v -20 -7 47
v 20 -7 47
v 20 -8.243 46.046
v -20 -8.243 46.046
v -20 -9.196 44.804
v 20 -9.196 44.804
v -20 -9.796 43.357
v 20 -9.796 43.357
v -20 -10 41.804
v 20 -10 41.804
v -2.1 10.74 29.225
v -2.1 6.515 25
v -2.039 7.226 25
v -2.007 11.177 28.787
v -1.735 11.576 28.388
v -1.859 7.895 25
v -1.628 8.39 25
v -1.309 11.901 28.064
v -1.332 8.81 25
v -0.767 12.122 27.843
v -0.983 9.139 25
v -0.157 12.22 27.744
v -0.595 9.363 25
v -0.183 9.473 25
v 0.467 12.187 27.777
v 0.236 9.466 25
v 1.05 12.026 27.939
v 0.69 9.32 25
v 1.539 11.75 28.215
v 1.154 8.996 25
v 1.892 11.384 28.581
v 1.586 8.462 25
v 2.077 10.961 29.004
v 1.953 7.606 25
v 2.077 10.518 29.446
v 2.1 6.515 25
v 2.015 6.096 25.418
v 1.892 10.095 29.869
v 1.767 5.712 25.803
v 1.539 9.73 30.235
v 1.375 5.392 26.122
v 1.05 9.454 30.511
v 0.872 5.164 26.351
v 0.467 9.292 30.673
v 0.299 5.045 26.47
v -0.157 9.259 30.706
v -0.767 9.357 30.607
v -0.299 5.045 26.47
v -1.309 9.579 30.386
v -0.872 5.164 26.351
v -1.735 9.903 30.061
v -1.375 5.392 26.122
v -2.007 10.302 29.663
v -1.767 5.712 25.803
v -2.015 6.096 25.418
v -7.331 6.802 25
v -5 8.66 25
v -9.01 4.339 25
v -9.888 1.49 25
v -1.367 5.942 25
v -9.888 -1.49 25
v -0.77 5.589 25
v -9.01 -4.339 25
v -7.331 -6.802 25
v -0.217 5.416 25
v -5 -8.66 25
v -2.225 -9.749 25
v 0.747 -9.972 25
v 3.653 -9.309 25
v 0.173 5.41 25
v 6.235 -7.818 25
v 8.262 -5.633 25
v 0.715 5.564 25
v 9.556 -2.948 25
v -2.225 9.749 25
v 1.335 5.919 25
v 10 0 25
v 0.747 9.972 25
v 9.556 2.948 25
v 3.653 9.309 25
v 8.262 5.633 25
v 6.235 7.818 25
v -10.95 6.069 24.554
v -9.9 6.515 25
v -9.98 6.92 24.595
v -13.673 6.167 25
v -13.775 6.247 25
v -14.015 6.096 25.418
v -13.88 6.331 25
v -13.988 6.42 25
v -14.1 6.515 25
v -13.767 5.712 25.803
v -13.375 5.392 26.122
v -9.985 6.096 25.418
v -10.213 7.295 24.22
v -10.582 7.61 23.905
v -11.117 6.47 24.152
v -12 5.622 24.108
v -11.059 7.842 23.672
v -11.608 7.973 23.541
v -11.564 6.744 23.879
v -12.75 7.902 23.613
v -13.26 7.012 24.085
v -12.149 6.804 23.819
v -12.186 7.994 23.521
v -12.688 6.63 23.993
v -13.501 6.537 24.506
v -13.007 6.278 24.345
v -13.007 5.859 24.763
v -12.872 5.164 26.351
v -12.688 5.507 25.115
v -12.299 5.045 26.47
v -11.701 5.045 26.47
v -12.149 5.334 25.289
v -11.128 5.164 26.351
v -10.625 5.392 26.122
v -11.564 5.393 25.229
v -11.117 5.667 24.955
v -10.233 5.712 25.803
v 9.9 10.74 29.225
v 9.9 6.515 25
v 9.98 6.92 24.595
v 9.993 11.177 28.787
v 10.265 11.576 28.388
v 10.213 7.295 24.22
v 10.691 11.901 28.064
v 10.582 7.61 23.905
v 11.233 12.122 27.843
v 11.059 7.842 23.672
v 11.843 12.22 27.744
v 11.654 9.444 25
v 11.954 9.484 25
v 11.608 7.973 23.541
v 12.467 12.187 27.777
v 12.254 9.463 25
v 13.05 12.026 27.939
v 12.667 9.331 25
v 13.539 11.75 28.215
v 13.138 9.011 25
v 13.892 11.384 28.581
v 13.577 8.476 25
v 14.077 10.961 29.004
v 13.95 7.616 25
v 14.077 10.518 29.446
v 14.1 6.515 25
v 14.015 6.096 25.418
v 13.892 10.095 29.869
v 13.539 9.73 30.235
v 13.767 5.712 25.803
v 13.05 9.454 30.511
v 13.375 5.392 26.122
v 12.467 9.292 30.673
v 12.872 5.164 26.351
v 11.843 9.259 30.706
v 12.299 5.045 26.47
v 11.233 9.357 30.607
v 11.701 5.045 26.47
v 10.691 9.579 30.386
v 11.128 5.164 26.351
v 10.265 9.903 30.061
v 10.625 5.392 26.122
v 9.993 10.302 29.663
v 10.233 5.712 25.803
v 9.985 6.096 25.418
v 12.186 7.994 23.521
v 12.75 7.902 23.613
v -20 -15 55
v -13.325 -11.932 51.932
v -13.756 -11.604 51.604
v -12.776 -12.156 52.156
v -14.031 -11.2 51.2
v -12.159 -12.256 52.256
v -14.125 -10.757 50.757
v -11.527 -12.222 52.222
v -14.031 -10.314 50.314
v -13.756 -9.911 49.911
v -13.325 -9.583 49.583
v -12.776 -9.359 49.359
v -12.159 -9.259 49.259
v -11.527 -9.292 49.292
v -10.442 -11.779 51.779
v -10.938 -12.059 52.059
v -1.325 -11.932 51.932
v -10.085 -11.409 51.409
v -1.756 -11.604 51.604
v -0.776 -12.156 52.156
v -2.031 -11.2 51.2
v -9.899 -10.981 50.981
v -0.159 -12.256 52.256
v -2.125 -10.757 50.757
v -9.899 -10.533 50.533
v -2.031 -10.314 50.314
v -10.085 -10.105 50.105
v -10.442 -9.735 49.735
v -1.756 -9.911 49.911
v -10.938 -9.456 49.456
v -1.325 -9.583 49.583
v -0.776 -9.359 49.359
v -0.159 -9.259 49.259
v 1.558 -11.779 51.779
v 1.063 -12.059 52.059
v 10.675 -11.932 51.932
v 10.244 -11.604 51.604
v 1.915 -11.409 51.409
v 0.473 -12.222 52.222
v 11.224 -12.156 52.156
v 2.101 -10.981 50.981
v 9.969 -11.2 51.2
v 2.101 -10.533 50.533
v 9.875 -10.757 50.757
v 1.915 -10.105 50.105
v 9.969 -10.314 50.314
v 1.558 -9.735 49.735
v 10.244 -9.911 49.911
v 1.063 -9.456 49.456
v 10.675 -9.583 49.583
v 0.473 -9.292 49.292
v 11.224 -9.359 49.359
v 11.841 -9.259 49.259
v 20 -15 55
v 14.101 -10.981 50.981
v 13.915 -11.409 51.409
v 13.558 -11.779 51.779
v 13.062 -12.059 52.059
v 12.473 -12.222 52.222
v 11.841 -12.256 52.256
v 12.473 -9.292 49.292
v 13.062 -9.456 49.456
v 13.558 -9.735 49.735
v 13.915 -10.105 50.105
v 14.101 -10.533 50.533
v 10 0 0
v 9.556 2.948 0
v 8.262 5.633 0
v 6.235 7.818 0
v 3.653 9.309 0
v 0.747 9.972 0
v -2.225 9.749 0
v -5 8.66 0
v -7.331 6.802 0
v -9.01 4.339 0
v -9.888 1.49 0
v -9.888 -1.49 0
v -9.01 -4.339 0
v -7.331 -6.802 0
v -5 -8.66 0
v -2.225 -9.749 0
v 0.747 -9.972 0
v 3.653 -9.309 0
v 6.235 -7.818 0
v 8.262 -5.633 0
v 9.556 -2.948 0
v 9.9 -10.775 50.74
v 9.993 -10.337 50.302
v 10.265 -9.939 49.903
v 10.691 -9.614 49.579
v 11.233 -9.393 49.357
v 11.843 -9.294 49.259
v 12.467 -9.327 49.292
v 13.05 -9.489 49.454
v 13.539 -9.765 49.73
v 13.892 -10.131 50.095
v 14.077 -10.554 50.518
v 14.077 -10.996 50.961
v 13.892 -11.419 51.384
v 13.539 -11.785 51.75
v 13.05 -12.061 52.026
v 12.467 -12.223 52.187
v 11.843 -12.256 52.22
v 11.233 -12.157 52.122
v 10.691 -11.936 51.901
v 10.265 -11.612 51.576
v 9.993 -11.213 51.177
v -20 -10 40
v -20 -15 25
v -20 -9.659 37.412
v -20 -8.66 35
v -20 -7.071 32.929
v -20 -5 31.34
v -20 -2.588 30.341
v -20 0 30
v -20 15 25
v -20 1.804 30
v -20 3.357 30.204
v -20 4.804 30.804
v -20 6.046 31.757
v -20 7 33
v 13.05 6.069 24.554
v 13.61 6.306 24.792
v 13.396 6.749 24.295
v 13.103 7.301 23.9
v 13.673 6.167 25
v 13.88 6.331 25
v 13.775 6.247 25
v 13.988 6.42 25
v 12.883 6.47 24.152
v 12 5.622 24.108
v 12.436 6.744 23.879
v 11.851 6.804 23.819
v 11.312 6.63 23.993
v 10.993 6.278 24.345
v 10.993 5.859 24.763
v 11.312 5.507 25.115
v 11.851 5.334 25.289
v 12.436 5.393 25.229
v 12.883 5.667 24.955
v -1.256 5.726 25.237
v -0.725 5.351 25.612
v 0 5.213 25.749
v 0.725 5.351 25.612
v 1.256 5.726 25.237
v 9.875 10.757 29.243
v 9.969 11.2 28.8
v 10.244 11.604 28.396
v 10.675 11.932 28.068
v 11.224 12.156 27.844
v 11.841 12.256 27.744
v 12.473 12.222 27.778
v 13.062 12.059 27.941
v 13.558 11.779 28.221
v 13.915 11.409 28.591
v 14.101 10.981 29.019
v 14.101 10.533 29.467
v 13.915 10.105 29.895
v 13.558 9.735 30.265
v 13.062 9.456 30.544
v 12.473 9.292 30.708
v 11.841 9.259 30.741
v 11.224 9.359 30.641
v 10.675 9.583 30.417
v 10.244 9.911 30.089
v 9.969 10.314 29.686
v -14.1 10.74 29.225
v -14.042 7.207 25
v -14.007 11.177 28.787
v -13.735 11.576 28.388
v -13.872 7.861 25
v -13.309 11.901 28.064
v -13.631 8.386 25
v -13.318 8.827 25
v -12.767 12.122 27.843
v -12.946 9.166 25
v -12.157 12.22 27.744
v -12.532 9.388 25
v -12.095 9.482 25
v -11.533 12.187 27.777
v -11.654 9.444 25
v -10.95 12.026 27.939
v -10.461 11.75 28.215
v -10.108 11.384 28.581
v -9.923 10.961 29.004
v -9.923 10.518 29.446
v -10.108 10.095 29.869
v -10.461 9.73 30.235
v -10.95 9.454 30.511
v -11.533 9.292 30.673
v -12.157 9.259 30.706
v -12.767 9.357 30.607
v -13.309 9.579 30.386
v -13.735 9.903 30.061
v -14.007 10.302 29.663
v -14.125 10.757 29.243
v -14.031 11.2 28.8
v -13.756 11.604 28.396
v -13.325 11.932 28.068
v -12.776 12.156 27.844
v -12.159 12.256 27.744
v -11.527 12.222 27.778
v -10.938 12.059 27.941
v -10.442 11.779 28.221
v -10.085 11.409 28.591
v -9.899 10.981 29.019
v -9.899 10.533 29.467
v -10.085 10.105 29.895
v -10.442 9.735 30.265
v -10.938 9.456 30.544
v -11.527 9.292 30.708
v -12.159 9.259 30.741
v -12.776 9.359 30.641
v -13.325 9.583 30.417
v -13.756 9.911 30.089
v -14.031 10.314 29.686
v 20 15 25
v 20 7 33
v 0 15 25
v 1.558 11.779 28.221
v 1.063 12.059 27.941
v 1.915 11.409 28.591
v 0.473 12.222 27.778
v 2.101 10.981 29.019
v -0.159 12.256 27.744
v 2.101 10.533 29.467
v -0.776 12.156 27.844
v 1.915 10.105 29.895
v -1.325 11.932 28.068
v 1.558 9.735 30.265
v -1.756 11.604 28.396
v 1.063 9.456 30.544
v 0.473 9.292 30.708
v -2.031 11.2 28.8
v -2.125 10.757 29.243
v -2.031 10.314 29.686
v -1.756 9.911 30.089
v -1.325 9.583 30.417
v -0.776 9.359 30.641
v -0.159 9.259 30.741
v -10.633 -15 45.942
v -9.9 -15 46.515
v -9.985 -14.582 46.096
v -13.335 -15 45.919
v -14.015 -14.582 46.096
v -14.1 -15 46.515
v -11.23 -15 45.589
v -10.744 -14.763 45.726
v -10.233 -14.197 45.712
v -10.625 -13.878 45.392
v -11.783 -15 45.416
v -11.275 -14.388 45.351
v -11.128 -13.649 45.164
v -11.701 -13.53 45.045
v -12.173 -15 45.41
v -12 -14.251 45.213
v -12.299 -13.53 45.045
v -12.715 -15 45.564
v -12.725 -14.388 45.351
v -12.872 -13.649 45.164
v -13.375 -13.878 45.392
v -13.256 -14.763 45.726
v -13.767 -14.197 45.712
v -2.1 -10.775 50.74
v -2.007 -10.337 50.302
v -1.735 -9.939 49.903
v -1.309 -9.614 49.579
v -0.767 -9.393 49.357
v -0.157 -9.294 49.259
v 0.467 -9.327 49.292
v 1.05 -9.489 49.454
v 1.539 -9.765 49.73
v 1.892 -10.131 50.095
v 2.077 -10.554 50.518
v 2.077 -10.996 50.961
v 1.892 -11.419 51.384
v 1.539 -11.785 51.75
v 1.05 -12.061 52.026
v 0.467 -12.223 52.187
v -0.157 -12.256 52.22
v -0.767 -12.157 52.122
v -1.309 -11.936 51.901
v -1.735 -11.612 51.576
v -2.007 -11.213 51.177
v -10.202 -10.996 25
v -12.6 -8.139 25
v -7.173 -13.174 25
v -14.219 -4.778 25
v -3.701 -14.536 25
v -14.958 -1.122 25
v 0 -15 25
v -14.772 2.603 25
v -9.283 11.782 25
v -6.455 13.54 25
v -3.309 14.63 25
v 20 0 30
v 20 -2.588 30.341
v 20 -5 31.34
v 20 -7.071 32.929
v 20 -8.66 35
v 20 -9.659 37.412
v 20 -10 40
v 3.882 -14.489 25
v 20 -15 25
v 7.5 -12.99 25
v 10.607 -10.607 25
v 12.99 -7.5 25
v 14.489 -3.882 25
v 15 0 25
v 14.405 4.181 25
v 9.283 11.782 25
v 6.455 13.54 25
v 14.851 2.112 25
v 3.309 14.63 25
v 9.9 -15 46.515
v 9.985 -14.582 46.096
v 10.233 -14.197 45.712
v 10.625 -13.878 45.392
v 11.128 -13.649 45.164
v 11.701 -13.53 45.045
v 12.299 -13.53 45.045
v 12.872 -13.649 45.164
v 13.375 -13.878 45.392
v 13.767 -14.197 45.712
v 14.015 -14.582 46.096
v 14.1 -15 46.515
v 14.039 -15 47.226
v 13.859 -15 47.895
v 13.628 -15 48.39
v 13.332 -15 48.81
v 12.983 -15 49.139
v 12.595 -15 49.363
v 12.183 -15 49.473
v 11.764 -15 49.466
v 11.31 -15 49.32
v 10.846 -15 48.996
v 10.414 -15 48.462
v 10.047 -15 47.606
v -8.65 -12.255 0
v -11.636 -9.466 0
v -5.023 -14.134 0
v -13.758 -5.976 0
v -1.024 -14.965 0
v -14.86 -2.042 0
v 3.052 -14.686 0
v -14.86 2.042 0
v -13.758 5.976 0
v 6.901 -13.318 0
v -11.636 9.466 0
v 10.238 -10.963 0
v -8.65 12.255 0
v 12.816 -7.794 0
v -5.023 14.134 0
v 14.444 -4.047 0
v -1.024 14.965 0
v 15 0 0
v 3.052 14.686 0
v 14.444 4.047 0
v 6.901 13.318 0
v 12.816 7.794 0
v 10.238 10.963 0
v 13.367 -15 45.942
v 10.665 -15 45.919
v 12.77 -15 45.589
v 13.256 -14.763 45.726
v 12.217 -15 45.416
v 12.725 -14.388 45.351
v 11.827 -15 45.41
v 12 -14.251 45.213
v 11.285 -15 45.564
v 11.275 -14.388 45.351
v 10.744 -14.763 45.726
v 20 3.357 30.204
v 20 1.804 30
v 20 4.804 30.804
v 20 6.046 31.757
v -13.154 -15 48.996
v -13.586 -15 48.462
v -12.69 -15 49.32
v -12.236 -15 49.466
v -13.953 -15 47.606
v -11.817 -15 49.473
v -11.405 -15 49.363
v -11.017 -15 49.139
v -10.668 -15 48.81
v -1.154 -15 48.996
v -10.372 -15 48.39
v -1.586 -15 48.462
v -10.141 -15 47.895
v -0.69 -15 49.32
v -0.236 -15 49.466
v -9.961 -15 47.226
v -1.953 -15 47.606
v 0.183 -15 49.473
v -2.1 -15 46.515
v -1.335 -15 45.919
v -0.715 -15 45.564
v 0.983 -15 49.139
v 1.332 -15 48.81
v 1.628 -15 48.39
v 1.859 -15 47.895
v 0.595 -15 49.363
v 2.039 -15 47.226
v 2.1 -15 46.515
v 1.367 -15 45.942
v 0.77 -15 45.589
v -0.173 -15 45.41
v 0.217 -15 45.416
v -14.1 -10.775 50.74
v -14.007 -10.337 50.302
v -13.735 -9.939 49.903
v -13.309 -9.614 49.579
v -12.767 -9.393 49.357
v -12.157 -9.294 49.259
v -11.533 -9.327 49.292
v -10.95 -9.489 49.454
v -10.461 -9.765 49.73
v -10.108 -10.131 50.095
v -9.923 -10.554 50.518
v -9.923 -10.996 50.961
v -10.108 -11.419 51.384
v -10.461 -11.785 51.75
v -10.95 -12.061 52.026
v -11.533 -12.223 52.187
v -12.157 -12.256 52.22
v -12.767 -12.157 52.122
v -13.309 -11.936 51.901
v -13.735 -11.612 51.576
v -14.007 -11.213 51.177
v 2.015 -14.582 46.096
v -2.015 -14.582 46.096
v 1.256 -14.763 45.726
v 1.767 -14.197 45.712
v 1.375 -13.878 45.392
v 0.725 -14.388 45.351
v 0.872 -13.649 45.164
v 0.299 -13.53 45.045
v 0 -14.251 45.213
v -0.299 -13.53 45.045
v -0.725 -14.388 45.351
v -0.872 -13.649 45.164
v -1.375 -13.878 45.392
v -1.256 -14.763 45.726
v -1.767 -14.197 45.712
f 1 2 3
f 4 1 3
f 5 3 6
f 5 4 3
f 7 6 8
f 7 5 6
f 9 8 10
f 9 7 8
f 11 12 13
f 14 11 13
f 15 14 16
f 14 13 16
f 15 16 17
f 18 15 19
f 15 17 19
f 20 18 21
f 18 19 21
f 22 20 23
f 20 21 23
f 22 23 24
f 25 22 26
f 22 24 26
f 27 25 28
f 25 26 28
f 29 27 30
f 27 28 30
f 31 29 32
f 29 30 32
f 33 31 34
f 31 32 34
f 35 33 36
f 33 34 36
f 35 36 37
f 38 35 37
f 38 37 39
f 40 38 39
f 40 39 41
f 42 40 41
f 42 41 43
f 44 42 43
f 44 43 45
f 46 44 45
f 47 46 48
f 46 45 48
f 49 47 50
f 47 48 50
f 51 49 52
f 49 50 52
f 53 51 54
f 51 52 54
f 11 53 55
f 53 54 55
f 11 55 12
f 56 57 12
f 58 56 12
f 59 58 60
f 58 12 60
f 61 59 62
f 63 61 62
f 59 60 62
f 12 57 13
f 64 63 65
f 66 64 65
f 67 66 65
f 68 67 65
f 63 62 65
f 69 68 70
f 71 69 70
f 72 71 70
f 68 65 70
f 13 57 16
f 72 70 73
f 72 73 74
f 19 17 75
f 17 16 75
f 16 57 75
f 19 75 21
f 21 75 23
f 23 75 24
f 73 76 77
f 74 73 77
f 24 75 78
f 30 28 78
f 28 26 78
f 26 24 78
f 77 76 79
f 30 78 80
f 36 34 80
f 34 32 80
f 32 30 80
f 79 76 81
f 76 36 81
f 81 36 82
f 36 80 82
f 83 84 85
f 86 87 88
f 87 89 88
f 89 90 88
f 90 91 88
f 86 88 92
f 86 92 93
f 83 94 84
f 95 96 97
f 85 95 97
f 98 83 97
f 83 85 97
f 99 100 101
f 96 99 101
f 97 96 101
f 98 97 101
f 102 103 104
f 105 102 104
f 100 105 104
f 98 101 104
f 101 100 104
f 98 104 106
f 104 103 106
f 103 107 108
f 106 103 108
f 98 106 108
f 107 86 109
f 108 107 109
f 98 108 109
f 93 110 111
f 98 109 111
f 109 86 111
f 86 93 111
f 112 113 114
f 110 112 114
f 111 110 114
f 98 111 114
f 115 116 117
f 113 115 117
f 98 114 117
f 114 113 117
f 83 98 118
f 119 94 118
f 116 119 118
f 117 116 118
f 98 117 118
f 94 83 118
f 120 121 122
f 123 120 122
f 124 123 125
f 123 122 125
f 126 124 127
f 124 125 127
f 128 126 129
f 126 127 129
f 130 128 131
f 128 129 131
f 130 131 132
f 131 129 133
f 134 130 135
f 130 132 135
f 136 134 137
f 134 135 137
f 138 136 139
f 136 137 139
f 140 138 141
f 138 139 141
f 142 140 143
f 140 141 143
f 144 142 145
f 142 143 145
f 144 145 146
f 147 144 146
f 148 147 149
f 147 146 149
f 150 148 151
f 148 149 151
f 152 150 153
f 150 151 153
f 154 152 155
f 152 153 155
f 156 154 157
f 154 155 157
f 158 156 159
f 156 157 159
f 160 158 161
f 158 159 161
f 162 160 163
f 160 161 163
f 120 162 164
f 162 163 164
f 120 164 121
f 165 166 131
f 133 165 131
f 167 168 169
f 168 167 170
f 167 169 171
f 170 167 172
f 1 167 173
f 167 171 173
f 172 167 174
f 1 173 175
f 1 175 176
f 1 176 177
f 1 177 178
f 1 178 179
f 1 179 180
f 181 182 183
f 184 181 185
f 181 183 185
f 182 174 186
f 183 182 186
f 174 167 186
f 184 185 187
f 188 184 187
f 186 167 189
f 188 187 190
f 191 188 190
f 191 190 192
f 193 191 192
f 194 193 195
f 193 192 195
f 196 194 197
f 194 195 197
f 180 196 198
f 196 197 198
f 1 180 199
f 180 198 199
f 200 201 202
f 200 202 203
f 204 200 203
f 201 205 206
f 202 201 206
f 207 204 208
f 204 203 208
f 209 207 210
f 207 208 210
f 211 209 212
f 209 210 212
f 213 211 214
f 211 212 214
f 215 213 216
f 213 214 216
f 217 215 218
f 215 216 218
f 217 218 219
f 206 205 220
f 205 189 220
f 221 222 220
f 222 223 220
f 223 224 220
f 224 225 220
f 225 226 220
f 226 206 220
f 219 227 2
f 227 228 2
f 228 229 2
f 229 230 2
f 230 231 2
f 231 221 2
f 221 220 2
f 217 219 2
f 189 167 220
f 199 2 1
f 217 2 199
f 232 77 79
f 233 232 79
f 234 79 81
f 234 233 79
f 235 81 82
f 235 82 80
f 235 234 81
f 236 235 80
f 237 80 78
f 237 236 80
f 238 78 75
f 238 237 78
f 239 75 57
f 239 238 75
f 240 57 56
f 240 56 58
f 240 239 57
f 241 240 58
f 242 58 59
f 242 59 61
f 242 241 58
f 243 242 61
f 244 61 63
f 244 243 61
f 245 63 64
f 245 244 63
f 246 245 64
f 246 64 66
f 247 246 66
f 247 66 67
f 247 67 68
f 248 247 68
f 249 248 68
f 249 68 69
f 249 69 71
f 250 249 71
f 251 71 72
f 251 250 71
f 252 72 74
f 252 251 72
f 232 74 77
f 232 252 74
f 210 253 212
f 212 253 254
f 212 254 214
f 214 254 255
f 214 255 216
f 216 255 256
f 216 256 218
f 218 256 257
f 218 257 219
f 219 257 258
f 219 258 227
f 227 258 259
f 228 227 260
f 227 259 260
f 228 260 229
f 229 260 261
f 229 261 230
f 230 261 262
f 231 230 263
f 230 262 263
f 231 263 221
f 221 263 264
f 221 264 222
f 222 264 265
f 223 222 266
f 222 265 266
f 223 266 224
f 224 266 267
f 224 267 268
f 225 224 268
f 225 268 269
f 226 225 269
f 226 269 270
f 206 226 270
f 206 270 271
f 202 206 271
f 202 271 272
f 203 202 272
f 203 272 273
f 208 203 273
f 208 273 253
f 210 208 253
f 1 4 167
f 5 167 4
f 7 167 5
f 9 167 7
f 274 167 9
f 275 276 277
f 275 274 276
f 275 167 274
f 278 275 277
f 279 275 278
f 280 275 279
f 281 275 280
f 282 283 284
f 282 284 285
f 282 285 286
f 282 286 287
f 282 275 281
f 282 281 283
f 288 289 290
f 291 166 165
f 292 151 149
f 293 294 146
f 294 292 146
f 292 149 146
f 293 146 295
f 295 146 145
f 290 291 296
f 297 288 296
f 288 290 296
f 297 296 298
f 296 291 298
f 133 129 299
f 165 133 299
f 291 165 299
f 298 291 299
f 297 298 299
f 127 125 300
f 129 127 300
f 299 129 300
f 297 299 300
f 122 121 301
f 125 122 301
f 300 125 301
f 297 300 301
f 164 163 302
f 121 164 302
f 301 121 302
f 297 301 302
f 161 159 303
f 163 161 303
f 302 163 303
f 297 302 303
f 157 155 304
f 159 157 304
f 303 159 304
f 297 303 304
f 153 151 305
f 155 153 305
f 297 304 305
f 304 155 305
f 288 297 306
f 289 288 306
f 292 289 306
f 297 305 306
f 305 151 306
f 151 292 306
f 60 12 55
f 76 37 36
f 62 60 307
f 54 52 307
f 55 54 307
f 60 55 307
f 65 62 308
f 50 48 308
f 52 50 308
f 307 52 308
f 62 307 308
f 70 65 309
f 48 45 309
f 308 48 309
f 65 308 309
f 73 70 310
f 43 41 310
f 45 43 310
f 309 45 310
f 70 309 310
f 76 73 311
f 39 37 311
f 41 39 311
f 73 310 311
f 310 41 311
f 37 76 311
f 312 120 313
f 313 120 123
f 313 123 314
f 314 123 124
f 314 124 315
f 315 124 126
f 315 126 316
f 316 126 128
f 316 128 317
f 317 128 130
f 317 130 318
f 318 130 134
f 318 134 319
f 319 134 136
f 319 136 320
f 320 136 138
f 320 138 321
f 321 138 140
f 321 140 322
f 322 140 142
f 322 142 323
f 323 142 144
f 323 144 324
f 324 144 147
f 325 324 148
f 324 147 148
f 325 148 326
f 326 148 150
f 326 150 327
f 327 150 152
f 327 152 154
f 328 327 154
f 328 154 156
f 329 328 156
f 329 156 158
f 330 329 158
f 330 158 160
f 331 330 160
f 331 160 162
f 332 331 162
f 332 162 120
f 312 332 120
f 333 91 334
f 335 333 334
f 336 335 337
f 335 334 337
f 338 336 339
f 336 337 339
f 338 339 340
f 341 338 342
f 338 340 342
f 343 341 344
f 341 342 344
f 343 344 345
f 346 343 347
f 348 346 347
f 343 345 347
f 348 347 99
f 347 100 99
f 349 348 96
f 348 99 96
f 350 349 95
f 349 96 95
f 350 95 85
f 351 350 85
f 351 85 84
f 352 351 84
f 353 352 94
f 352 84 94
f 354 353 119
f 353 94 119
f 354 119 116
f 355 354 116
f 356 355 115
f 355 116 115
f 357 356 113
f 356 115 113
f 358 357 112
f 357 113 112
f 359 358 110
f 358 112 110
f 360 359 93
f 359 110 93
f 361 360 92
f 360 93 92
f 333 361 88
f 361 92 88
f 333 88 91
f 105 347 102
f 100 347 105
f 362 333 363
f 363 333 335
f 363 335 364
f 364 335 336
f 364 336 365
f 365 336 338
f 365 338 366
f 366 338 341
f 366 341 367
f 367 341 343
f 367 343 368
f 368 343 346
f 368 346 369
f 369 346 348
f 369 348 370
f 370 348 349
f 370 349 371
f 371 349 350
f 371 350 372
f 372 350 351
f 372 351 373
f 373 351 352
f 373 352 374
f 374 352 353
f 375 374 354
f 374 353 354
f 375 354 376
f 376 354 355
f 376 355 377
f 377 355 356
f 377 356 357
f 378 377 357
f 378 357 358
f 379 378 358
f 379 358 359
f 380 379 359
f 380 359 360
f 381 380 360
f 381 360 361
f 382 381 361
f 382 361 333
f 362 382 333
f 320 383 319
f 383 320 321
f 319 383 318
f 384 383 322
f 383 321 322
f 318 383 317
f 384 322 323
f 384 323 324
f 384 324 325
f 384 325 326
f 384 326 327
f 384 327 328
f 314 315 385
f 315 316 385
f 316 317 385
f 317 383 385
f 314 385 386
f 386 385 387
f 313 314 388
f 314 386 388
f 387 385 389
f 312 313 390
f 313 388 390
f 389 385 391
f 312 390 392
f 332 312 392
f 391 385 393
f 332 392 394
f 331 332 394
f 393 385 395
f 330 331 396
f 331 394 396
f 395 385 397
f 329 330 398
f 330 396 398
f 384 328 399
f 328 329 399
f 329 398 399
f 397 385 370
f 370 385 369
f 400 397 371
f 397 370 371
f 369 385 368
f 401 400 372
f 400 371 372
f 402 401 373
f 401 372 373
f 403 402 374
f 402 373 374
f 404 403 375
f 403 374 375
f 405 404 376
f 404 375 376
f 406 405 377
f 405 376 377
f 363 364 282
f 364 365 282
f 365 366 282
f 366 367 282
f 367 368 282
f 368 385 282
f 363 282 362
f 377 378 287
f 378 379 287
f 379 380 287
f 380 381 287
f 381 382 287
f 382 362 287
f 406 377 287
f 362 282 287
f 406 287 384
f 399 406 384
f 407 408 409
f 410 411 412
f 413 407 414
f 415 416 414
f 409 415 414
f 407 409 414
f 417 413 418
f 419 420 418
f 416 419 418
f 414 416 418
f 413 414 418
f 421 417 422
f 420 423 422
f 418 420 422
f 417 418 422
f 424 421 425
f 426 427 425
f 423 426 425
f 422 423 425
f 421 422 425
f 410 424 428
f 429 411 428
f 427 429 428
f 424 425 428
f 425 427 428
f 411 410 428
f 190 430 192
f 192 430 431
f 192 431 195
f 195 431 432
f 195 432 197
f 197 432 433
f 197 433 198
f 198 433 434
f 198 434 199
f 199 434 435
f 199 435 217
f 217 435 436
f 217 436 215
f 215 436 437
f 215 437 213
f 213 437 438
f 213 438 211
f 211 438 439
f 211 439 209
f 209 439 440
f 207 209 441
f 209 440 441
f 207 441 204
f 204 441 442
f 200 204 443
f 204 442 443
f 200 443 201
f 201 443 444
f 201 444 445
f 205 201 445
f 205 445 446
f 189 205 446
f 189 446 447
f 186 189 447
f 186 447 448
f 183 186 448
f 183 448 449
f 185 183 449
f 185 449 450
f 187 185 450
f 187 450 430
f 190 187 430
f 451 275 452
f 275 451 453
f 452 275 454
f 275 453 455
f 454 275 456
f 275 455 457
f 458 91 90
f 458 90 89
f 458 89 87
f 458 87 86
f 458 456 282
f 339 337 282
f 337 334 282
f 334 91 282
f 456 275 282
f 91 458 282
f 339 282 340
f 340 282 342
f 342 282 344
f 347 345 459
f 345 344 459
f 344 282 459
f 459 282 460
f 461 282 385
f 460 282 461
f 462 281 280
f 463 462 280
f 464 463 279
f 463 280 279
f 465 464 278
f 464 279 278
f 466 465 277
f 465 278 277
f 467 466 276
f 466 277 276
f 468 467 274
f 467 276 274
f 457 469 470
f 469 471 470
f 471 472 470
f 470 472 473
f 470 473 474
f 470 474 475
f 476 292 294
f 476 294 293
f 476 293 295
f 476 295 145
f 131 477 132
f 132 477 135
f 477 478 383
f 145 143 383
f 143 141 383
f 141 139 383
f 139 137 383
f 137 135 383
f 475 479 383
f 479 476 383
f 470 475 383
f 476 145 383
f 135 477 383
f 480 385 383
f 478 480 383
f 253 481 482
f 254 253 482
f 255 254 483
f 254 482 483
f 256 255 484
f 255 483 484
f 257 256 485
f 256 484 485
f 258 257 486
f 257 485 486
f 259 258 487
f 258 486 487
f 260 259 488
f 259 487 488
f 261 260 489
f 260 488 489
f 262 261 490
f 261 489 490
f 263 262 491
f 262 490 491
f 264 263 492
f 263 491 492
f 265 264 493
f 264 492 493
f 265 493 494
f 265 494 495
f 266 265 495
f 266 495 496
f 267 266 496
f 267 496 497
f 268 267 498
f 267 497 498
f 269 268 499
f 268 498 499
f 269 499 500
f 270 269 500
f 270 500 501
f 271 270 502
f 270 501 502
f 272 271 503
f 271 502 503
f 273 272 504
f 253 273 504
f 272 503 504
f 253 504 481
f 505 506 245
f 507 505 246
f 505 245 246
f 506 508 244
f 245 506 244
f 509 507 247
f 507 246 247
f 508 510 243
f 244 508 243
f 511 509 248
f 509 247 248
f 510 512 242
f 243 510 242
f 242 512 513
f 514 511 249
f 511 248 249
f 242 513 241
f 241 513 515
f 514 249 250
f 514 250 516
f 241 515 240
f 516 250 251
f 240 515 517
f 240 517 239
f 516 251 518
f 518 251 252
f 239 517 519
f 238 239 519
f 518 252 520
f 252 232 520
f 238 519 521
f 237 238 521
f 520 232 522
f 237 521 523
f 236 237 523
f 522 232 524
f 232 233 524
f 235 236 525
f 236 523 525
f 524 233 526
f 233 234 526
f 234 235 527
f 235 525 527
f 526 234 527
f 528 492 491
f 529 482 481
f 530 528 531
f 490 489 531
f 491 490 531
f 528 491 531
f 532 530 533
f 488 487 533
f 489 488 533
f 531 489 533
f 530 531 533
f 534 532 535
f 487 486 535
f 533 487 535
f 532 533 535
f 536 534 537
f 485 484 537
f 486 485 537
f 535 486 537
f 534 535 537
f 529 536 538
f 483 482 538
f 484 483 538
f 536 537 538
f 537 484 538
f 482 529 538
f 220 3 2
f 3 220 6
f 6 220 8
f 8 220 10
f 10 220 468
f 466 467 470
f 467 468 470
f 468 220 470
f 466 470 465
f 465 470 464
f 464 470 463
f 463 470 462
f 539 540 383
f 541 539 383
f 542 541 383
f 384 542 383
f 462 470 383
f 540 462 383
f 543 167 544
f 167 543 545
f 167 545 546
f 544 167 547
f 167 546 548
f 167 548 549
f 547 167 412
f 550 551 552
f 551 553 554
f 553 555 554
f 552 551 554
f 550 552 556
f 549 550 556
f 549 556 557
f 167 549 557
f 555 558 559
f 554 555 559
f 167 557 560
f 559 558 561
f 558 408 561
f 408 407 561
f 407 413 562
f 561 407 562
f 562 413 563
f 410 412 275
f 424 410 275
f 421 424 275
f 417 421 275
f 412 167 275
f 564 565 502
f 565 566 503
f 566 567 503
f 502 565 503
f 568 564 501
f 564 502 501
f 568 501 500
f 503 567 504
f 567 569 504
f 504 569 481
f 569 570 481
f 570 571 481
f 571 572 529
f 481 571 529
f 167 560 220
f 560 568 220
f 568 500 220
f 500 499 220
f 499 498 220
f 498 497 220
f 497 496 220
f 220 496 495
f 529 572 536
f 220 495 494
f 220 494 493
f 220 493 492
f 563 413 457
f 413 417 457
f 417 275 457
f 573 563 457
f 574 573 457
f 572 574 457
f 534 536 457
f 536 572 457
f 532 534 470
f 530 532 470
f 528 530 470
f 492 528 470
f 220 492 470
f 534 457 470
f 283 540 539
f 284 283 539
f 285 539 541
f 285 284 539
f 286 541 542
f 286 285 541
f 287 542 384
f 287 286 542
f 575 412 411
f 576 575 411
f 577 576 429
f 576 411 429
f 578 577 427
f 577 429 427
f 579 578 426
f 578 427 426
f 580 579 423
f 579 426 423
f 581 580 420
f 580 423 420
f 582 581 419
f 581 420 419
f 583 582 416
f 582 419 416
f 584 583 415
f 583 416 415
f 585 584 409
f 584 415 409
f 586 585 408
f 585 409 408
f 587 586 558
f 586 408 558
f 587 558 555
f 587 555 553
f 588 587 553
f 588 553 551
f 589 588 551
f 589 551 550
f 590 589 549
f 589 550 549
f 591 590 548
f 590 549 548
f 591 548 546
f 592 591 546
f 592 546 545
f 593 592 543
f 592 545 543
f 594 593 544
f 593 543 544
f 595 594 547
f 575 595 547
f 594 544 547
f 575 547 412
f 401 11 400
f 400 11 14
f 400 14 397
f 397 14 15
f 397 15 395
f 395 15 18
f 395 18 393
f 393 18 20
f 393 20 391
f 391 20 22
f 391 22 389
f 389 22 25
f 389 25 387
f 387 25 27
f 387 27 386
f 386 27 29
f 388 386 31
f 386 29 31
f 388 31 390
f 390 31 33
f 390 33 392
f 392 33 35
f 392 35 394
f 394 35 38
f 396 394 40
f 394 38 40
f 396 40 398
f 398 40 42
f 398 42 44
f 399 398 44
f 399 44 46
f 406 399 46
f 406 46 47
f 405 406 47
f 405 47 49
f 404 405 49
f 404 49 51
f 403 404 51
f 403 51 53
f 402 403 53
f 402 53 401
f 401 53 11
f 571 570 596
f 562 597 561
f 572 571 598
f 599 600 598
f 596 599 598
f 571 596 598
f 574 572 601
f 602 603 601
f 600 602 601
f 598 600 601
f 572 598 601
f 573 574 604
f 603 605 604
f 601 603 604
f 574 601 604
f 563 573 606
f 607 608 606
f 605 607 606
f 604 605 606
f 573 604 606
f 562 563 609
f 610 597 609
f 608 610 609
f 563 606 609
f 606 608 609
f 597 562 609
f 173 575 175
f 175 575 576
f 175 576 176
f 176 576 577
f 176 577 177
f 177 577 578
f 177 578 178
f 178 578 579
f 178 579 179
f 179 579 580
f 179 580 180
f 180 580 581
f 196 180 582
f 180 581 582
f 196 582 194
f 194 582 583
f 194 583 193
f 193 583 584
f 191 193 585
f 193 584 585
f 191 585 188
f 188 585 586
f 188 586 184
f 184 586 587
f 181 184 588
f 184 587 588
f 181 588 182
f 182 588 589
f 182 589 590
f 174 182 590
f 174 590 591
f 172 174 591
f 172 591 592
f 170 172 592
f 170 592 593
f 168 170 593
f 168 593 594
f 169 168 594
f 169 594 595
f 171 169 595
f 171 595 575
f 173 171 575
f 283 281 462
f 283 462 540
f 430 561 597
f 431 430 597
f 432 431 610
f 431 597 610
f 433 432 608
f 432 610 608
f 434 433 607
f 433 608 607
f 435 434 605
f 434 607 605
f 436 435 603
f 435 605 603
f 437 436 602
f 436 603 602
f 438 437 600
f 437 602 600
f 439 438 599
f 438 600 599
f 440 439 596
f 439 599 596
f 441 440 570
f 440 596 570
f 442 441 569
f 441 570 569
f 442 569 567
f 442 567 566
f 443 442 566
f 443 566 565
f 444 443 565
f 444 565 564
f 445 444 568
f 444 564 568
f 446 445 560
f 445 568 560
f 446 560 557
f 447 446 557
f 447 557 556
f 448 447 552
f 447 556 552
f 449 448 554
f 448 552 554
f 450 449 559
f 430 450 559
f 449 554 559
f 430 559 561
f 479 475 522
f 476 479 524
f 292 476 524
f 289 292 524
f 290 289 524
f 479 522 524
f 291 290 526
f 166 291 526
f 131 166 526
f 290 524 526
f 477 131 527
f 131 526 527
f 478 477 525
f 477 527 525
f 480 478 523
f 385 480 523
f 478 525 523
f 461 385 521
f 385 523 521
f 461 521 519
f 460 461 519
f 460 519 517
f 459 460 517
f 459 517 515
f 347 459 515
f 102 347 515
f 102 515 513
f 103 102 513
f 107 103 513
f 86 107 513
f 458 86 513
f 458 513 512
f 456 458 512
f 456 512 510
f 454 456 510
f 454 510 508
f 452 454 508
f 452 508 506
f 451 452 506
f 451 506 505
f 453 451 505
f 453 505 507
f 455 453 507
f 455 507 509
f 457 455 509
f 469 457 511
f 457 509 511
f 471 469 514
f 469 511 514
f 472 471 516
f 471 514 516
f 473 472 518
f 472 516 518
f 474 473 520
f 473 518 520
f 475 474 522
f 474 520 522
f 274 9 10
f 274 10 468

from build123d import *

# Parameters (mm, degrees)
SKETCH1_R                            = 15
SKETCH1_R_2                          = 10
BOSS_EXTRUDE1_DEPTH                  = 25
SKETCH2_W                            = 40
SKETCH2_H                            = 30
BOSS_EXTRUDE2_DEPTH                  = 30
SKETCH3_R                            = 10
CUT_EXTRUDE1_DEPTH                   = 70.641941386
CUT_EXTRUDE2_DEPTH                   = 70.641941386
CUT_EXTRUDE6_DEPTH                   = 70.641941386
BOSS_EXTRUDE3_DEPTH                  = 40
FILLET1_R                            = 6
F_4_2_4_2_DIAMETER_HOLE1_D           = 4.2
F_4_2_4_2_DIAMETER_HOLE1_DEPTH       = 6
F_4_2_4_2_DIAMETER_HOLE1_CSINK_D     = 4.25
F_4_2_4_2_DIAMETER_HOLE1_CSINK_ANGLE = 90
F_4_2_4_2_DIAMETER_HOLE1_TIP         = 1.2618073


with BuildPart() as part:
    # Sketch1 → Boss-Extrude1 (new body)
    with BuildSketch(Plane.XY):
        Circle(SKETCH1_R)
        Circle(SKETCH1_R_2, mode=Mode.SUBTRACT)
    extrude(amount=BOSS_EXTRUDE1_DEPTH)

    # Sketch2 → Boss-Extrude2 (add)
    with BuildSketch(Plane.XY.offset(25)):
        Rectangle(SKETCH2_W, SKETCH2_H)
    extrude(amount=BOSS_EXTRUDE2_DEPTH)

    # Sketch3 → Cut-Extrude1 (cut, through all)
    with BuildSketch(Plane.ZY.offset(20)):
        with Locations(Location((40, 0, 0), (0, 0, 270))):
            Circle(SKETCH3_R)
    extrude(amount=-CUT_EXTRUDE1_DEPTH, mode=Mode.SUBTRACT)

    # Sketch4 → Cut-Extrude2 (cut, through all)
    with BuildSketch(Plane(origin=(20, 0, 0), x_dir=(0, 0, -1), z_dir=(1, 0, 0))):
        with BuildLine():
            Line((-30, 0), (-30, 15))
            Line((-30, 15), (-55, 15))
            Line((-55, 15), (-55, -10))
            Line((-55, -10), (-40, -10))
            ThreePointArc((-40, -10), (-32.928932188, -7.071067812), (-30, 0))
        make_face()
    extrude(amount=-CUT_EXTRUDE2_DEPTH, mode=Mode.SUBTRACT)

    # Sketch6 → Cut-Extrude6 (cut, through all)
    with BuildSketch(Plane(origin=(20, 0, 0), x_dir=(0, 0, -1), z_dir=(1, 0, 0))):
        Polygon((-25, 15), (-30, 10), (-30, 15), align=None)
        Polygon((-55, -10), (-55, -15), (-50, -10), align=None)
    extrude(amount=-CUT_EXTRUDE6_DEPTH, mode=Mode.SUBTRACT)

    # Sketch7 → Boss-Extrude3 (add)
    with BuildSketch(Plane.ZY.offset(20)):
        Polygon((30, 10), (33, 7), (30, 7), align=None)
        Polygon((50, -10), (47, -7), (47, -10), align=None)
    extrude(amount=-BOSS_EXTRUDE3_DEPTH)

    # Fillet1
    # the kernel refuses this fillet: 6 mm, written as the material it adds along each edge
    with BuildSketch(Plane(origin=(-20, -10, 47), x_dir=(0, 1, 0), z_dir=(1, 0, 0))) as fillet1_piece_1_section:
        with BuildLine():
            CenterArc((6, -5.196152423), FILLET1_R, 120, 60)
            Line((0, -5.196152423), (-0.12, -5.196152423))
            Line((-0.12, -5.196152423), (-0.12, 0))
            Line((-0.12, 0), (0, 0.12))
            ThreePointArc((0, 0.12), (1.5, 0.12), (2.94, 0.103923048))
            Line((2.94, 0.103923048), (3, 0))
        make_face()
    fillet1_piece_1 = extrude(amount=40, mode=Mode.PRIVATE)
    fillet1_piece_1 = split(fillet1_piece_1, bisect_by=Plane(origin=(0, -7.462685522, 47.462685522), z_dir=(0, -0.7071067811865475, -0.7071067811865477)), keep=Keep.TOP, mode=Mode.PRIVATE)
    add(fillet1_piece_1)
    with BuildSketch(Plane(origin=(-20, 7, 30), x_dir=(0, -1, 0), z_dir=(1, 0, 0))) as fillet1_piece_2_section:
        with BuildLine():
            CenterArc((5.196152423, -6), FILLET1_R, 90, 60)
            Line((0, -3), (-0.103923048, -2.94))
            ThreePointArc((-0.103923048, -2.94), (-0.12, -1.5), (-0.12, 0))
            Line((-0.12, 0), (0, 0.12))
            Line((0, 0.12), (5.196152423, 0.12))
            Line((5.196152423, 0.12), (5.196152423, 0))
        make_face()
    fillet1_piece_2 = extrude(amount=40, mode=Mode.PRIVATE)
    fillet1_piece_2 = split(fillet1_piece_2, bisect_by=Plane(origin=(0, 7.462685522, 32.537314478), z_dir=(0, -0.7071067811865477, -0.7071067811865475)), keep=Keep.TOP, mode=Mode.PRIVATE)
    add(fillet1_piece_2)

    # Ø4.2 (4.2) Diameter Hole1
    with Locations(Plane(origin=(0, 20, 20), x_dir=(1, 0, 0), z_dir=(0, 0.7071067811865475, 0.7071067811865477))):
        with Locations((12, -43.497474683), (0, -43.497474683), (-12, -43.497474683), (-12, -13.071067812), (0, -13.071067812), (12, -13.071067812)):
            CounterSinkHole(F_4_2_4_2_DIAMETER_HOLE1_D / 2, F_4_2_4_2_DIAMETER_HOLE1_CSINK_D / 2, depth=F_4_2_4_2_DIAMETER_HOLE1_DEPTH, counter_sink_angle=F_4_2_4_2_DIAMETER_HOLE1_CSINK_ANGLE)
            with Locations((0, 0, -(F_4_2_4_2_DIAMETER_HOLE1_DEPTH + F_4_2_4_2_DIAMETER_HOLE1_TIP / 2))):  # 118° drill point
                Cone(0, F_4_2_4_2_DIAMETER_HOLE1_D / 2, F_4_2_4_2_DIAMETER_HOLE1_TIP, mode=Mode.SUBTRACT)


solid = part.part
